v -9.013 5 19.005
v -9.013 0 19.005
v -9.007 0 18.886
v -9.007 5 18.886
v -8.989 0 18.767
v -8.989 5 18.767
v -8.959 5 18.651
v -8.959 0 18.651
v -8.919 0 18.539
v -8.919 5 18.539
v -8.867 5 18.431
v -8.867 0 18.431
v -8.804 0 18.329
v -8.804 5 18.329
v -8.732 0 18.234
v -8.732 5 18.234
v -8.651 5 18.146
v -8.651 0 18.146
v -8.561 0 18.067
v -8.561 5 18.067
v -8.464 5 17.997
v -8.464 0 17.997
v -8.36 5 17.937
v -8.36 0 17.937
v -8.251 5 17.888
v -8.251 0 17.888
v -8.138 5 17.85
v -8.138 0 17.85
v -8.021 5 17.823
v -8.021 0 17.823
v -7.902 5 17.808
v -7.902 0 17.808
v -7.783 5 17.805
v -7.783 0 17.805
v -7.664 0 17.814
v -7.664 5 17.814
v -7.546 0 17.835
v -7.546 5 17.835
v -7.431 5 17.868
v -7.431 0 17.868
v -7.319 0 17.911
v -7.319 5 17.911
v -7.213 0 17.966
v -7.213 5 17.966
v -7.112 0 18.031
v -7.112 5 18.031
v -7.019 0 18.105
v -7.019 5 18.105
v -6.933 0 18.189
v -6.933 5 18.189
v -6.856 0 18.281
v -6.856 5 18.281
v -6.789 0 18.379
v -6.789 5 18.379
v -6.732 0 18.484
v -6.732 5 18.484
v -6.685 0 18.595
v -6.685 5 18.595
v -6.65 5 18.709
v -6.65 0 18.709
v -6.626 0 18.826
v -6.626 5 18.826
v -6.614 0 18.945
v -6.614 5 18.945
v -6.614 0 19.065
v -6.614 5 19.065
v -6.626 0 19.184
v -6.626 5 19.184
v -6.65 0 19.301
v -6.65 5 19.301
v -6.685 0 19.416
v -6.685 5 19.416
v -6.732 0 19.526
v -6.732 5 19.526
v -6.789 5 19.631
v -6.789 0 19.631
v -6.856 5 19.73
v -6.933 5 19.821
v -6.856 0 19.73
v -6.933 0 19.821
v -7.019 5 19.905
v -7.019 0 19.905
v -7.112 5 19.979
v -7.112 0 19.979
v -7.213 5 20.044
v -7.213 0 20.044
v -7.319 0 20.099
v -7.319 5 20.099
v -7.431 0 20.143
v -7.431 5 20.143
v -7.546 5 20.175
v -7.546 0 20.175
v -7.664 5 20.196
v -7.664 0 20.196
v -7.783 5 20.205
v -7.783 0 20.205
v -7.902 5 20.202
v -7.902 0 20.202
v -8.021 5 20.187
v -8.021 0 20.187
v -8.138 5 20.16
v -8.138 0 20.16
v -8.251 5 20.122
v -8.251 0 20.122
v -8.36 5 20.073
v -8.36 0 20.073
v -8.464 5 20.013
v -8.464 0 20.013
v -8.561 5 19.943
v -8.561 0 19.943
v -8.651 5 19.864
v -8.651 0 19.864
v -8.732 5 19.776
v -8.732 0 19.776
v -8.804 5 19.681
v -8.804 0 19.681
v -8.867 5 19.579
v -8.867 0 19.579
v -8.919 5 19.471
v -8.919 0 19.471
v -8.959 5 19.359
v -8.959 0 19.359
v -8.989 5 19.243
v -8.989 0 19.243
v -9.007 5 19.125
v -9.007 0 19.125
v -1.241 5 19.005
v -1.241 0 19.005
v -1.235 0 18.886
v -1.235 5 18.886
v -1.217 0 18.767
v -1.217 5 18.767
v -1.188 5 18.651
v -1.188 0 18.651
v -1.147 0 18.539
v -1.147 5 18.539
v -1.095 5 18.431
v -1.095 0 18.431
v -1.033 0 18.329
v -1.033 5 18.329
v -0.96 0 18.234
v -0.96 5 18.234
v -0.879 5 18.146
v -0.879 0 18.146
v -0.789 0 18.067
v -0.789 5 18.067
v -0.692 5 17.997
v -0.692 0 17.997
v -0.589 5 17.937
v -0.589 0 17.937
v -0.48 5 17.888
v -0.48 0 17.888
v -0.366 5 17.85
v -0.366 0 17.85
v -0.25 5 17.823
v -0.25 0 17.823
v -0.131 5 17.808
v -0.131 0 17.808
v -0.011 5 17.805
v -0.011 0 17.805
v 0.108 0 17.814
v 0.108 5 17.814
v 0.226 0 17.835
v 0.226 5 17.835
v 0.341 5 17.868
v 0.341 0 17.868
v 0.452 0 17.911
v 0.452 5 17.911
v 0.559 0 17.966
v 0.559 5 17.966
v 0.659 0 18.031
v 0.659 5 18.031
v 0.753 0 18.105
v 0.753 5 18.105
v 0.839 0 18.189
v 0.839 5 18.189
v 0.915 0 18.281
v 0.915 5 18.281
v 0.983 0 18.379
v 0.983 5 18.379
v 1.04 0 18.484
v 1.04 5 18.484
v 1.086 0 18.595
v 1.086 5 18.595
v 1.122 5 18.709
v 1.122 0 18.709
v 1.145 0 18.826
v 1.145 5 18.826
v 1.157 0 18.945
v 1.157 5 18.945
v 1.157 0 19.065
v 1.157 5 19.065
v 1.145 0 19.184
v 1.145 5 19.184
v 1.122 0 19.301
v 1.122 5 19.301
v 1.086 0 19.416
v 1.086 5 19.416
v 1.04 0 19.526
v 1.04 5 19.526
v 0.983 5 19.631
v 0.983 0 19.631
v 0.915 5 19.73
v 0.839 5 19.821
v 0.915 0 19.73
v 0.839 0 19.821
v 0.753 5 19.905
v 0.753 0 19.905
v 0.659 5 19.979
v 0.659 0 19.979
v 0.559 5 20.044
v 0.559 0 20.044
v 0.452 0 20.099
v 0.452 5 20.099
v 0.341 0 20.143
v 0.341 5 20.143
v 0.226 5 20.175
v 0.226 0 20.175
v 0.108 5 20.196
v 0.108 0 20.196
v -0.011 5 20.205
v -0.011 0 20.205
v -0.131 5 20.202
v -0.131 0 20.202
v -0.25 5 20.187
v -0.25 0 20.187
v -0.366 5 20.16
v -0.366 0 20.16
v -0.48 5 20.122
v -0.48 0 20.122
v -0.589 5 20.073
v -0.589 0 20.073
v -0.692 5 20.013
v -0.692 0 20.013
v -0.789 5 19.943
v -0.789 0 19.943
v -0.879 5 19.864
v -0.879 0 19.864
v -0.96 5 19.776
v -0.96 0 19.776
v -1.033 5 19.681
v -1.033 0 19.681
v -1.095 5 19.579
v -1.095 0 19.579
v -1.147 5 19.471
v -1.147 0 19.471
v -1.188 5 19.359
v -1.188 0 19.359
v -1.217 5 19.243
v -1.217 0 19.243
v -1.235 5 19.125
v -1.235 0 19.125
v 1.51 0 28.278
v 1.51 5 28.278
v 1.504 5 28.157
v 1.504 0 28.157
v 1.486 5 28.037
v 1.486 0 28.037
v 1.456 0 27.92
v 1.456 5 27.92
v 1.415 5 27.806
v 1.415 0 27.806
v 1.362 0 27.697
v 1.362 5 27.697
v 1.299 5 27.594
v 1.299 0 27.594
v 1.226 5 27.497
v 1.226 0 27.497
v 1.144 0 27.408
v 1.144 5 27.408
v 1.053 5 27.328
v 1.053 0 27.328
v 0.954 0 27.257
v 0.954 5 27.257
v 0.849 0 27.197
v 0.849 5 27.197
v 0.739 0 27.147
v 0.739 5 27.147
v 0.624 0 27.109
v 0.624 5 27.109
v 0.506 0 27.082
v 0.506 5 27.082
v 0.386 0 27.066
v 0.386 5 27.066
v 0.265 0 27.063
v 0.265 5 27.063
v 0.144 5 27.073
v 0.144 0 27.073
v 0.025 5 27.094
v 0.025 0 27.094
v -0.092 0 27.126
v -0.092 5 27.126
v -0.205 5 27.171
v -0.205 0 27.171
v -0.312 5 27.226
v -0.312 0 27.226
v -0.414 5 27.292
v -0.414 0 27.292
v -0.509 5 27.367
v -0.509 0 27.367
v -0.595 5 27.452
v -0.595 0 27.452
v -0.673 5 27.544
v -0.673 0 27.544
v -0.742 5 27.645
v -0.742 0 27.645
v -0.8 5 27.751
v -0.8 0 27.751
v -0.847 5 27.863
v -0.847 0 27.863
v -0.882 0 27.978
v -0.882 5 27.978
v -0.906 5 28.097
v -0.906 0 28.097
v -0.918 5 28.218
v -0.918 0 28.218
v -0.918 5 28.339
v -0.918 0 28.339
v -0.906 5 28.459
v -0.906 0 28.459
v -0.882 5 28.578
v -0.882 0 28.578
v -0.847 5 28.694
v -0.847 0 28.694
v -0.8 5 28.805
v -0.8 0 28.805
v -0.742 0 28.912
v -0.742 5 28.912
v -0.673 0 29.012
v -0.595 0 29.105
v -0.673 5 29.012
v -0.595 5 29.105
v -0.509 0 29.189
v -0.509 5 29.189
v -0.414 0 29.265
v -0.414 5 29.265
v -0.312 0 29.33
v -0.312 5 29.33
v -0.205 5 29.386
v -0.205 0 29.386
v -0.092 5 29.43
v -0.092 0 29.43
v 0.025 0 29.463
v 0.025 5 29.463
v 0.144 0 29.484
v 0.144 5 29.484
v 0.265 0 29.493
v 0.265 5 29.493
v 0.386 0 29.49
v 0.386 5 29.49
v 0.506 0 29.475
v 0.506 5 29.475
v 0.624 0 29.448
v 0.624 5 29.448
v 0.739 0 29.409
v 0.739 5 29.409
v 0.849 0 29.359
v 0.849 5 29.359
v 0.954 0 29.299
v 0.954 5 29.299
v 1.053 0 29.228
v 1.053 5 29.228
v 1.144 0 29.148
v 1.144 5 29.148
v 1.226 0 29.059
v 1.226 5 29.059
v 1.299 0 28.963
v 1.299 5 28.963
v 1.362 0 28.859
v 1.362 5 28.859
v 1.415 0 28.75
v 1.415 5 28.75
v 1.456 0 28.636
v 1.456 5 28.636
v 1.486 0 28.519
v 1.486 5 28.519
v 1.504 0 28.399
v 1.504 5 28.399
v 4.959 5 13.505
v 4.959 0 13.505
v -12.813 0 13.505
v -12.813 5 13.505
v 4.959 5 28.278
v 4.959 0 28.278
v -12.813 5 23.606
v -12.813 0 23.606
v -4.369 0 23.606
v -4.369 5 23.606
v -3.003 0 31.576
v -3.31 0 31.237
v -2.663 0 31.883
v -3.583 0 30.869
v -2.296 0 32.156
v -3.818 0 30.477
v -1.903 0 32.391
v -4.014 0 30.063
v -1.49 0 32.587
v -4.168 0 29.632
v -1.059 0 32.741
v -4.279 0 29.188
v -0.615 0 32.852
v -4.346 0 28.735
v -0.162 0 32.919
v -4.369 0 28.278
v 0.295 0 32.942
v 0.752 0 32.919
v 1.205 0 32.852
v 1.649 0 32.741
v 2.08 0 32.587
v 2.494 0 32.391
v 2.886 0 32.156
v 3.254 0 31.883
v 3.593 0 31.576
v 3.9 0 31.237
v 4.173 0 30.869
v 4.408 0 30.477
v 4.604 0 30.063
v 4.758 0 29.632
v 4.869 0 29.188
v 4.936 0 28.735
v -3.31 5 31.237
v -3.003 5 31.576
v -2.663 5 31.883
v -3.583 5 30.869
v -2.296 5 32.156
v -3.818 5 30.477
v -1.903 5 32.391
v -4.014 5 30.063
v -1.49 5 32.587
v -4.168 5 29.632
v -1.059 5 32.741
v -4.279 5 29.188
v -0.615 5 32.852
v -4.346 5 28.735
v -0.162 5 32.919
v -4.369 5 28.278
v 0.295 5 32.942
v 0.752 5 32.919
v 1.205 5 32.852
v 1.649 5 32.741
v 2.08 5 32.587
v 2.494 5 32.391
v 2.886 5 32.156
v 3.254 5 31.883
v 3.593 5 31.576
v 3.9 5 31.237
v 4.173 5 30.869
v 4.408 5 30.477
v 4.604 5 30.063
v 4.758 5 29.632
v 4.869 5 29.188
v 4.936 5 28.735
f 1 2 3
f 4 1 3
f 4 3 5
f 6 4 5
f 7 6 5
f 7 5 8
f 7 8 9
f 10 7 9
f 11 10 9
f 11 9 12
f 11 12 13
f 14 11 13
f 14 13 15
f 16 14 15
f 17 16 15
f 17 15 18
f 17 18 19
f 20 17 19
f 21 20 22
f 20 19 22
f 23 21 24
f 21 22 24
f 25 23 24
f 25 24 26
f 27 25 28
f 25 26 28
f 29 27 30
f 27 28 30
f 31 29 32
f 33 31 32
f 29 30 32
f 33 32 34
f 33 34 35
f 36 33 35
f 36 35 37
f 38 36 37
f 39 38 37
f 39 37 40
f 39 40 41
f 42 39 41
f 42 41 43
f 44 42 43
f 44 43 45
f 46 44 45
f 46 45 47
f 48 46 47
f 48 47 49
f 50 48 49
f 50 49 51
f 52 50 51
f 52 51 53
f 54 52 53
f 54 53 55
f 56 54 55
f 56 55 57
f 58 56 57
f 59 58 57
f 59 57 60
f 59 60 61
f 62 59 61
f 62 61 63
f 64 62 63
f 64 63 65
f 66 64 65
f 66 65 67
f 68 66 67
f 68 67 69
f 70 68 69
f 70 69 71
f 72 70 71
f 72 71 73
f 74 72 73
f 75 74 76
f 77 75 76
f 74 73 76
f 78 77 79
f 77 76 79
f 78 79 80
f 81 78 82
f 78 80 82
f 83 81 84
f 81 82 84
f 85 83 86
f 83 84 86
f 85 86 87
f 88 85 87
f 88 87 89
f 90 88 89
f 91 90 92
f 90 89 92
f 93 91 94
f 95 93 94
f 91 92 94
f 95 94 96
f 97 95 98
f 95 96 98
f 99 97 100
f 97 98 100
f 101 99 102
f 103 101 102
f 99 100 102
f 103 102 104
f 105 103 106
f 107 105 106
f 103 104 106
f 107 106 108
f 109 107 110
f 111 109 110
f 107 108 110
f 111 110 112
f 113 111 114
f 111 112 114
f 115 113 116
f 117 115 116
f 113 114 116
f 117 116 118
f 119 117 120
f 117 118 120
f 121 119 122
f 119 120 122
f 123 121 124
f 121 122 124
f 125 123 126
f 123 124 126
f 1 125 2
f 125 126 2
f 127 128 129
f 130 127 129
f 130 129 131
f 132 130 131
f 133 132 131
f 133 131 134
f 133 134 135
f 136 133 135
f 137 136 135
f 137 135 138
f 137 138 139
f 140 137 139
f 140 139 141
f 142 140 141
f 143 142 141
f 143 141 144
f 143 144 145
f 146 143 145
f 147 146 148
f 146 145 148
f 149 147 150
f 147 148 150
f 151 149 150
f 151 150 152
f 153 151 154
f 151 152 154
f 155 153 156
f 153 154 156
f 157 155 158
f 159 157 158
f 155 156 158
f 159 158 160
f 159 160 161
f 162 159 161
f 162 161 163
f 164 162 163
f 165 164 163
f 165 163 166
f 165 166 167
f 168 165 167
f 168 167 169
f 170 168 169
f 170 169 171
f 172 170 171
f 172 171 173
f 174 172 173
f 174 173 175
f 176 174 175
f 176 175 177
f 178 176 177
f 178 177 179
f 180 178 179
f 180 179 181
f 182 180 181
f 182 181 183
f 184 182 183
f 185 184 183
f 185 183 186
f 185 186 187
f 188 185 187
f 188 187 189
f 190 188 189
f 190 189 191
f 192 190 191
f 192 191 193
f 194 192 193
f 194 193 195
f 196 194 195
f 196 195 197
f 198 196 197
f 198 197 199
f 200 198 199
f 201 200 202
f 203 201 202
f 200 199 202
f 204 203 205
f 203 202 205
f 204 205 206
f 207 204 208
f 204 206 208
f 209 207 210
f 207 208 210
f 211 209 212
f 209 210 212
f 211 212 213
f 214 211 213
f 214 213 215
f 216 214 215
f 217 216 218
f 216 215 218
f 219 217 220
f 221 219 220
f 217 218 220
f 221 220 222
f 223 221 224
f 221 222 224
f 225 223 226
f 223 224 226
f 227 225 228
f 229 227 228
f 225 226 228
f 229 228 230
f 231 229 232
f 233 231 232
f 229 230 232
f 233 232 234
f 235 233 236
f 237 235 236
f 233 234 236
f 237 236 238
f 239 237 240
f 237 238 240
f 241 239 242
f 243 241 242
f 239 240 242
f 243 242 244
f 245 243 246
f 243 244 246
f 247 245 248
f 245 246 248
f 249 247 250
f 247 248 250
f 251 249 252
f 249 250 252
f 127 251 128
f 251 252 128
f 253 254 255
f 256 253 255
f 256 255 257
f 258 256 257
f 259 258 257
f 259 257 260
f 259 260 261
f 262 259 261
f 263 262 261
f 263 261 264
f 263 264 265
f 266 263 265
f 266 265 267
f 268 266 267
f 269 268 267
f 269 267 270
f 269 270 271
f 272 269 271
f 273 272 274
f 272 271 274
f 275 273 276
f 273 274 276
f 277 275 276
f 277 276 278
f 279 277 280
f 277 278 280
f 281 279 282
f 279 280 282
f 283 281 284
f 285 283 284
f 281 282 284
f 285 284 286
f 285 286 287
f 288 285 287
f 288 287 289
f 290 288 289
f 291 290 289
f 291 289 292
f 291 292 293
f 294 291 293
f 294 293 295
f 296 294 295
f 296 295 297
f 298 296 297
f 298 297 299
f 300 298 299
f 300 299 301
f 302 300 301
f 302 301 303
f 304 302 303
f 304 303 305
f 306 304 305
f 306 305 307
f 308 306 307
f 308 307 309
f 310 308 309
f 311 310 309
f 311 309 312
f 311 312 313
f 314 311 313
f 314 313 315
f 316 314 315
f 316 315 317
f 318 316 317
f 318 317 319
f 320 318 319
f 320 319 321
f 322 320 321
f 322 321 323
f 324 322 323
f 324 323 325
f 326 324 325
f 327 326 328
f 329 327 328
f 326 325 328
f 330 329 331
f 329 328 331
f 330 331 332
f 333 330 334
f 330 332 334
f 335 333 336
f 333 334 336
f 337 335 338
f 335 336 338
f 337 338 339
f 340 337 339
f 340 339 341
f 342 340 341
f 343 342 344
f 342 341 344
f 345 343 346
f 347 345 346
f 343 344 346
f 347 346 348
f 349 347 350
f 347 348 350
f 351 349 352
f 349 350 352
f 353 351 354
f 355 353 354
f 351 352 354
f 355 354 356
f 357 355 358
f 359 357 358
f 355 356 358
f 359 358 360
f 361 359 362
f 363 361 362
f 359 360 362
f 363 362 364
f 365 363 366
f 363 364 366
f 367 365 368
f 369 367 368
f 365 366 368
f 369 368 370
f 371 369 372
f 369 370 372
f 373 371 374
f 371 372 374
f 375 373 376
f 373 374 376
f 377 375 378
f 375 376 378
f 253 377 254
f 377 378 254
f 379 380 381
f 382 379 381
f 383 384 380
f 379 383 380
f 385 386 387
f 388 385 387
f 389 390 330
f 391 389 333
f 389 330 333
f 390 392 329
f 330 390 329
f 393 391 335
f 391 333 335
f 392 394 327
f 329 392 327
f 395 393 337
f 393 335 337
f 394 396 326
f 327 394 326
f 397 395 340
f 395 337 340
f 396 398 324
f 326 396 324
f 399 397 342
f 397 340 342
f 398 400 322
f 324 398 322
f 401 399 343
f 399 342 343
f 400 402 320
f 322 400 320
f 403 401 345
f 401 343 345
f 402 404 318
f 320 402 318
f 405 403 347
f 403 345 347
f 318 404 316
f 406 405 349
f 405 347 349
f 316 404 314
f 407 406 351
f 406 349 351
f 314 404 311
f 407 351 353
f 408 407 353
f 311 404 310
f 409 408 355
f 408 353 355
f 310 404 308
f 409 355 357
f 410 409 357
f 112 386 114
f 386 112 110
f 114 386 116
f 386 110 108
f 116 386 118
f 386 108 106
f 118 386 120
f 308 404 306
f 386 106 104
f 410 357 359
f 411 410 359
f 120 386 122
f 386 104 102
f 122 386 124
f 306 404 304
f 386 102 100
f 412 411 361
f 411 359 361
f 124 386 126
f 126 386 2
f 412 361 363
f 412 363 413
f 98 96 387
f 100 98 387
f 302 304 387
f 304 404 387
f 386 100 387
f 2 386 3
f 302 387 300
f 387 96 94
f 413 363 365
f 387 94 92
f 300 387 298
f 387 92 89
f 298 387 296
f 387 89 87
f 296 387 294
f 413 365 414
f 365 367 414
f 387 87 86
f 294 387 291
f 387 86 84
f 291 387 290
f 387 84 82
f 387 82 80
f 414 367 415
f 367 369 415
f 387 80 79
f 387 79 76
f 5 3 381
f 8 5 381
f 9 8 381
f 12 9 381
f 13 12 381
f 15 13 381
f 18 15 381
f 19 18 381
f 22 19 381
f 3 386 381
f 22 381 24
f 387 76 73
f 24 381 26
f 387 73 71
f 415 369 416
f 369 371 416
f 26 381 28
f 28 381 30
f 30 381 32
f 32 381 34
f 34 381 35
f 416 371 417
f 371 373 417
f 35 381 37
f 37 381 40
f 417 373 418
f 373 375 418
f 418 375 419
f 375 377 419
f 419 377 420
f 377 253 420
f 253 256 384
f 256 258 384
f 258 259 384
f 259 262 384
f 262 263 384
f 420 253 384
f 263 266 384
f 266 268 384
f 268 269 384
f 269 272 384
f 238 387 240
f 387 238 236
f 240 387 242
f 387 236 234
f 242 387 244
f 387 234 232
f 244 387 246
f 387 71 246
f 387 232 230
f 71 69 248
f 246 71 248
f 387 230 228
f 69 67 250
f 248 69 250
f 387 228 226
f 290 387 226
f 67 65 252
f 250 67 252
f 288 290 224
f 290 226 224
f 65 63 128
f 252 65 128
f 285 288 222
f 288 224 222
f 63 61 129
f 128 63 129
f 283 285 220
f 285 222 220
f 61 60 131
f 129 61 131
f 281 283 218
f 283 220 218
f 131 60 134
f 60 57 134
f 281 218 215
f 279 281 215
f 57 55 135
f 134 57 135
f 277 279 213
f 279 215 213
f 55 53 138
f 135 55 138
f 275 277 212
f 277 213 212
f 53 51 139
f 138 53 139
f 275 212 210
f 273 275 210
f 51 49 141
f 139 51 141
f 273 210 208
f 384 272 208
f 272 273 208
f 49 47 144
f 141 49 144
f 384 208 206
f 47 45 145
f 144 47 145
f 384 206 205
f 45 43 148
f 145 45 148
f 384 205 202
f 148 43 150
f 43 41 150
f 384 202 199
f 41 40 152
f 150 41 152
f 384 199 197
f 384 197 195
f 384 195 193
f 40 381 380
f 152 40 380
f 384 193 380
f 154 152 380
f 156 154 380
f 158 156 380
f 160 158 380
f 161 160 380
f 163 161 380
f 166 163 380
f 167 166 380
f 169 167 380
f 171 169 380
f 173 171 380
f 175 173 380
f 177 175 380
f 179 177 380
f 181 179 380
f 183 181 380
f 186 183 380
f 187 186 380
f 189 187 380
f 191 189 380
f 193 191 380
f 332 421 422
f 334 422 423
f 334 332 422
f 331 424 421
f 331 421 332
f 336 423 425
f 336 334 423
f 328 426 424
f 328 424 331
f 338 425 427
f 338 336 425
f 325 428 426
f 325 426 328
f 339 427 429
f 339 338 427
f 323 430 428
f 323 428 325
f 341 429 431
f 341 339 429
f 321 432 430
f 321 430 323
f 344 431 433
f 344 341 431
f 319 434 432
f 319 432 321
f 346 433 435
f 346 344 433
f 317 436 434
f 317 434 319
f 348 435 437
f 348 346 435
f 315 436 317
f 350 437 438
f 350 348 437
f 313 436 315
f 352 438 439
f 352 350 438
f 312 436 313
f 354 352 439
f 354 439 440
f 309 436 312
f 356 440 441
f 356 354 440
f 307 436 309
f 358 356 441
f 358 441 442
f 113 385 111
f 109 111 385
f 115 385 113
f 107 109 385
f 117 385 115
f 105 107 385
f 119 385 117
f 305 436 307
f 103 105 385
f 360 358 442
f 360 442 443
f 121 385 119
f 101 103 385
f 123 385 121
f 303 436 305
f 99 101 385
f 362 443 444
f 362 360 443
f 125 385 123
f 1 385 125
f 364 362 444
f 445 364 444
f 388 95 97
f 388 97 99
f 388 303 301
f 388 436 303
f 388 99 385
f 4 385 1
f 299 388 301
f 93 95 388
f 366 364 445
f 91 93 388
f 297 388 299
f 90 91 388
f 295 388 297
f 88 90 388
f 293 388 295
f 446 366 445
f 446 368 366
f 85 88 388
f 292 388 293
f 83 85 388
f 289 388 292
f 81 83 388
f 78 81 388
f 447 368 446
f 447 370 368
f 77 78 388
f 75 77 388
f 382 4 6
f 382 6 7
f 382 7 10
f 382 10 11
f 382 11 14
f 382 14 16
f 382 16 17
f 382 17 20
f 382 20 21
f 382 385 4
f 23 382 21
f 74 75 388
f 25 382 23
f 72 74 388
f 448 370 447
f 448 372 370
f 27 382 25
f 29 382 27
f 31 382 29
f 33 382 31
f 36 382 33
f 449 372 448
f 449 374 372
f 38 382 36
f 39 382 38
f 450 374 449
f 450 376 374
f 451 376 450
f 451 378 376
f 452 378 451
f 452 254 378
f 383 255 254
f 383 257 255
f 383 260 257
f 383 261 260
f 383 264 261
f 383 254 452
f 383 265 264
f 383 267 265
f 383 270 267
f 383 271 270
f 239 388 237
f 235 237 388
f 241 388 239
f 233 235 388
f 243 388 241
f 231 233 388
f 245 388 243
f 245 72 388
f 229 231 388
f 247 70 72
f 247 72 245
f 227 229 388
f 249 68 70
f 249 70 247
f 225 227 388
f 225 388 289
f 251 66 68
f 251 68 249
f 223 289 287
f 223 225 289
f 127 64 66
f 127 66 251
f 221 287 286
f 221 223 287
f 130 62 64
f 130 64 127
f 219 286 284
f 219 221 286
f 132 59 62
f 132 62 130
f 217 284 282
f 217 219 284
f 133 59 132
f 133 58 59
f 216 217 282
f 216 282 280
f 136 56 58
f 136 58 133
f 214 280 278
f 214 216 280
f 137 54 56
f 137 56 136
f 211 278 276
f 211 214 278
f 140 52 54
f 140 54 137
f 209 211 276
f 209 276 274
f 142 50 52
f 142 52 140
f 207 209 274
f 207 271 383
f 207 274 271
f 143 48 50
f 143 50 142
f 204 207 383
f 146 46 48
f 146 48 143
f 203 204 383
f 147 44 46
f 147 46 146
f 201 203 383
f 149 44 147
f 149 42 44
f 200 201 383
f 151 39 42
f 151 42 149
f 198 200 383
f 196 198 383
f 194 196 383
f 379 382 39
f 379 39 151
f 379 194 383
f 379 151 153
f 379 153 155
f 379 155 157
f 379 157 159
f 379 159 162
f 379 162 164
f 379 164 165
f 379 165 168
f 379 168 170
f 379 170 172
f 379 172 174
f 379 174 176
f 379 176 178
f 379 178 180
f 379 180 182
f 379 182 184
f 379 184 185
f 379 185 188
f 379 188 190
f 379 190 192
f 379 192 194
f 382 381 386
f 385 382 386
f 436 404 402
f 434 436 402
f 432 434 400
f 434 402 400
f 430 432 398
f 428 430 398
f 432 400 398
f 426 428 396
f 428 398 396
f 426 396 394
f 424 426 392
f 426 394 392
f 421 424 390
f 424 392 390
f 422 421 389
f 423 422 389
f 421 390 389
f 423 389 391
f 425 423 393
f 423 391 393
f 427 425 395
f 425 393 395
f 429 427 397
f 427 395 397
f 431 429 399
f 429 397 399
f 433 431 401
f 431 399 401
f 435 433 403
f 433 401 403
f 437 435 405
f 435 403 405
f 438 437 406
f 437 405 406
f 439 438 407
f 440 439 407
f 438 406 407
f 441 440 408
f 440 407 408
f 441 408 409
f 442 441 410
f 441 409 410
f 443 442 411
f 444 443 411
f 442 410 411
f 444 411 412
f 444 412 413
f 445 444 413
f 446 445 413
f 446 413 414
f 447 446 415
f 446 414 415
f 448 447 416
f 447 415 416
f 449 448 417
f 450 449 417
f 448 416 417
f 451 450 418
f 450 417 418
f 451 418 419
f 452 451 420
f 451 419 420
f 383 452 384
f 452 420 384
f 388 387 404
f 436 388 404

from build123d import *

# Parameters (mm, degrees)
BOSS_EXTRUDE1_DEPTH      = 5
M2_CLEARANCE_HOLE1_D     = 2.4
M2_CLEARANCE_HOLE1_DEPTH = 12
M2_CLEARANCE_HOLE1_TIP   = 0.721032743
SKETCH6_R                = 1.215
CUT_EXTRUDE1_DEPTH       = 10


with BuildPart() as part:
    # Sketch1 → Boss-Extrude1 (new body)
    with BuildSketch(Plane(origin=(0, 0, 0), x_dir=(1, 0, 0), z_dir=(0, 1, 0))):
        with BuildLine():
            Line((4.958856711, -28.278101888), (4.958856711, -16.278101888))
            Line((4.958856711, -16.278101888), (4.958856711, -13.505087823))
            Line((4.958856711, -13.505087823), (-12.812745649, -13.505087823))
            Line((-12.812745649, -13.505087823), (-12.812745649, -16.278101888))
            Line((-12.812745649, -16.278101888), (-12.812745649, -23.605635188))
            Line((-12.812745649, -23.605635188), (-4.368523326, -23.605635188))
            Line((-4.368523326, -23.605635188), (-4.368523326, -28.278101888))
            ThreePointArc((-4.368523326, -28.278101888), (0.295166692, -32.941791906), (4.958856711, -28.278101888))
        make_face()
    extrude(amount=BOSS_EXTRUDE1_DEPTH)

    # M2 Clearance Hole1
    with Locations(Plane(origin=(0, 5, 0), x_dir=(1, 0, 0), z_dir=(0, 1, 0))):
        with Locations((-0.041143289, -19.005087823), (-7.812745649, -19.005087823)):
            Hole(M2_CLEARANCE_HOLE1_D / 2, depth=M2_CLEARANCE_HOLE1_DEPTH)
            with Locations((0, 0, -(M2_CLEARANCE_HOLE1_DEPTH + M2_CLEARANCE_HOLE1_TIP / 2))):  # 118° drill point
                Cone(0, M2_CLEARANCE_HOLE1_D / 2, M2_CLEARANCE_HOLE1_TIP, mode=Mode.SUBTRACT)

    # Sketch6 → Cut-Extrude1 (cut)
    with BuildSketch(Plane(origin=(0, 5, 0), x_dir=(1, 0, 0), z_dir=(0, 1, 0))):
        with Locations((0.295166692, -28.278101888)):
            Circle(SKETCH6_R)
    extrude(amount=-CUT_EXTRUDE1_DEPTH, mode=Mode.SUBTRACT)


solid = part.part
